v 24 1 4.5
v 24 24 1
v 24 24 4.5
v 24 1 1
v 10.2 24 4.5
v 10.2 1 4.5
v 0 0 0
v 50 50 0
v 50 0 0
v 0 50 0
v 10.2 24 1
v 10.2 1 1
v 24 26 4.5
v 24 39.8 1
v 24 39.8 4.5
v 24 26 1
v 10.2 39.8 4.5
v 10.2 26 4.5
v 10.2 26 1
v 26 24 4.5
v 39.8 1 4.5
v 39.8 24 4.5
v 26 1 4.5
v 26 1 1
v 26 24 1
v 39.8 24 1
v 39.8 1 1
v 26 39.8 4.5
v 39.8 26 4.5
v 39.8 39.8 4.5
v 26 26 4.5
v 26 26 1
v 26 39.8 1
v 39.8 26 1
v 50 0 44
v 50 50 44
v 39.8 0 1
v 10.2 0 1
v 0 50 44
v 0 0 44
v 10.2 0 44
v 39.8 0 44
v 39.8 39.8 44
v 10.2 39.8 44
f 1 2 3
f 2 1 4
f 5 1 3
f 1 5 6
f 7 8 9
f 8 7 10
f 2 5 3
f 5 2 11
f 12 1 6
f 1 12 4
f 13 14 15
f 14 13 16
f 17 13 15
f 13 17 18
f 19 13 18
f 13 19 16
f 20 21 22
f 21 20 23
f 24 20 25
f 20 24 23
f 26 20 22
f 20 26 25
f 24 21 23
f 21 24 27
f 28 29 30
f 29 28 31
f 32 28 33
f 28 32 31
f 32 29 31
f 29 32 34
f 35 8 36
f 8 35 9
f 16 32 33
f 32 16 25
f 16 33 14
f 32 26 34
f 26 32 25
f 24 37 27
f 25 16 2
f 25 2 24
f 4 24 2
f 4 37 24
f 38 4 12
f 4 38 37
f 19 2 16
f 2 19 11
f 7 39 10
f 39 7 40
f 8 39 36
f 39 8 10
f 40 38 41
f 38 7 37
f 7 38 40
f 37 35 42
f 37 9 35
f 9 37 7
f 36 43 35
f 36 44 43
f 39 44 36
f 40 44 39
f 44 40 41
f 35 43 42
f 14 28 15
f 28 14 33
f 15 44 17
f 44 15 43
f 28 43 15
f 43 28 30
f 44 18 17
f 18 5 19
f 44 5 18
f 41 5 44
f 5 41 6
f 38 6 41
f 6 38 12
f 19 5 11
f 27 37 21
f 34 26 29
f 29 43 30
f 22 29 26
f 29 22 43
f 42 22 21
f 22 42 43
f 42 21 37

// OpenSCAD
_basis = 25;

module dead_end(x=2, y=2, h=2, base=false) {
    base_buffer = base ? 6 : 0;
    translate([0,0,base_buffer]) color("LightGray") {
        for (i = [0:x-1]) {
            for (j = [0:y-1]) {
                translate([_basis*i+1,_basis*j+1,0]) cube([23,23,4.5]);
            }
        }
    }

    color("Grey") {
        cube([_basis*x,_basis*y,1+base_buffer]);
        translate([0,_basis*y-10.2,0]) cube([_basis*x,10.2,_basis*h-6+base_buffer]);
        translate([0,0,0]) cube([10.2,_basis*y,_basis*h-6+base_buffer]);
        translate([_basis*x-10.2,0,0]) cube([10.2,_basis*y,_basis*h-6+base_buffer]);
    }
}

dead_end(x=2, y=2, h=2, base=false);
